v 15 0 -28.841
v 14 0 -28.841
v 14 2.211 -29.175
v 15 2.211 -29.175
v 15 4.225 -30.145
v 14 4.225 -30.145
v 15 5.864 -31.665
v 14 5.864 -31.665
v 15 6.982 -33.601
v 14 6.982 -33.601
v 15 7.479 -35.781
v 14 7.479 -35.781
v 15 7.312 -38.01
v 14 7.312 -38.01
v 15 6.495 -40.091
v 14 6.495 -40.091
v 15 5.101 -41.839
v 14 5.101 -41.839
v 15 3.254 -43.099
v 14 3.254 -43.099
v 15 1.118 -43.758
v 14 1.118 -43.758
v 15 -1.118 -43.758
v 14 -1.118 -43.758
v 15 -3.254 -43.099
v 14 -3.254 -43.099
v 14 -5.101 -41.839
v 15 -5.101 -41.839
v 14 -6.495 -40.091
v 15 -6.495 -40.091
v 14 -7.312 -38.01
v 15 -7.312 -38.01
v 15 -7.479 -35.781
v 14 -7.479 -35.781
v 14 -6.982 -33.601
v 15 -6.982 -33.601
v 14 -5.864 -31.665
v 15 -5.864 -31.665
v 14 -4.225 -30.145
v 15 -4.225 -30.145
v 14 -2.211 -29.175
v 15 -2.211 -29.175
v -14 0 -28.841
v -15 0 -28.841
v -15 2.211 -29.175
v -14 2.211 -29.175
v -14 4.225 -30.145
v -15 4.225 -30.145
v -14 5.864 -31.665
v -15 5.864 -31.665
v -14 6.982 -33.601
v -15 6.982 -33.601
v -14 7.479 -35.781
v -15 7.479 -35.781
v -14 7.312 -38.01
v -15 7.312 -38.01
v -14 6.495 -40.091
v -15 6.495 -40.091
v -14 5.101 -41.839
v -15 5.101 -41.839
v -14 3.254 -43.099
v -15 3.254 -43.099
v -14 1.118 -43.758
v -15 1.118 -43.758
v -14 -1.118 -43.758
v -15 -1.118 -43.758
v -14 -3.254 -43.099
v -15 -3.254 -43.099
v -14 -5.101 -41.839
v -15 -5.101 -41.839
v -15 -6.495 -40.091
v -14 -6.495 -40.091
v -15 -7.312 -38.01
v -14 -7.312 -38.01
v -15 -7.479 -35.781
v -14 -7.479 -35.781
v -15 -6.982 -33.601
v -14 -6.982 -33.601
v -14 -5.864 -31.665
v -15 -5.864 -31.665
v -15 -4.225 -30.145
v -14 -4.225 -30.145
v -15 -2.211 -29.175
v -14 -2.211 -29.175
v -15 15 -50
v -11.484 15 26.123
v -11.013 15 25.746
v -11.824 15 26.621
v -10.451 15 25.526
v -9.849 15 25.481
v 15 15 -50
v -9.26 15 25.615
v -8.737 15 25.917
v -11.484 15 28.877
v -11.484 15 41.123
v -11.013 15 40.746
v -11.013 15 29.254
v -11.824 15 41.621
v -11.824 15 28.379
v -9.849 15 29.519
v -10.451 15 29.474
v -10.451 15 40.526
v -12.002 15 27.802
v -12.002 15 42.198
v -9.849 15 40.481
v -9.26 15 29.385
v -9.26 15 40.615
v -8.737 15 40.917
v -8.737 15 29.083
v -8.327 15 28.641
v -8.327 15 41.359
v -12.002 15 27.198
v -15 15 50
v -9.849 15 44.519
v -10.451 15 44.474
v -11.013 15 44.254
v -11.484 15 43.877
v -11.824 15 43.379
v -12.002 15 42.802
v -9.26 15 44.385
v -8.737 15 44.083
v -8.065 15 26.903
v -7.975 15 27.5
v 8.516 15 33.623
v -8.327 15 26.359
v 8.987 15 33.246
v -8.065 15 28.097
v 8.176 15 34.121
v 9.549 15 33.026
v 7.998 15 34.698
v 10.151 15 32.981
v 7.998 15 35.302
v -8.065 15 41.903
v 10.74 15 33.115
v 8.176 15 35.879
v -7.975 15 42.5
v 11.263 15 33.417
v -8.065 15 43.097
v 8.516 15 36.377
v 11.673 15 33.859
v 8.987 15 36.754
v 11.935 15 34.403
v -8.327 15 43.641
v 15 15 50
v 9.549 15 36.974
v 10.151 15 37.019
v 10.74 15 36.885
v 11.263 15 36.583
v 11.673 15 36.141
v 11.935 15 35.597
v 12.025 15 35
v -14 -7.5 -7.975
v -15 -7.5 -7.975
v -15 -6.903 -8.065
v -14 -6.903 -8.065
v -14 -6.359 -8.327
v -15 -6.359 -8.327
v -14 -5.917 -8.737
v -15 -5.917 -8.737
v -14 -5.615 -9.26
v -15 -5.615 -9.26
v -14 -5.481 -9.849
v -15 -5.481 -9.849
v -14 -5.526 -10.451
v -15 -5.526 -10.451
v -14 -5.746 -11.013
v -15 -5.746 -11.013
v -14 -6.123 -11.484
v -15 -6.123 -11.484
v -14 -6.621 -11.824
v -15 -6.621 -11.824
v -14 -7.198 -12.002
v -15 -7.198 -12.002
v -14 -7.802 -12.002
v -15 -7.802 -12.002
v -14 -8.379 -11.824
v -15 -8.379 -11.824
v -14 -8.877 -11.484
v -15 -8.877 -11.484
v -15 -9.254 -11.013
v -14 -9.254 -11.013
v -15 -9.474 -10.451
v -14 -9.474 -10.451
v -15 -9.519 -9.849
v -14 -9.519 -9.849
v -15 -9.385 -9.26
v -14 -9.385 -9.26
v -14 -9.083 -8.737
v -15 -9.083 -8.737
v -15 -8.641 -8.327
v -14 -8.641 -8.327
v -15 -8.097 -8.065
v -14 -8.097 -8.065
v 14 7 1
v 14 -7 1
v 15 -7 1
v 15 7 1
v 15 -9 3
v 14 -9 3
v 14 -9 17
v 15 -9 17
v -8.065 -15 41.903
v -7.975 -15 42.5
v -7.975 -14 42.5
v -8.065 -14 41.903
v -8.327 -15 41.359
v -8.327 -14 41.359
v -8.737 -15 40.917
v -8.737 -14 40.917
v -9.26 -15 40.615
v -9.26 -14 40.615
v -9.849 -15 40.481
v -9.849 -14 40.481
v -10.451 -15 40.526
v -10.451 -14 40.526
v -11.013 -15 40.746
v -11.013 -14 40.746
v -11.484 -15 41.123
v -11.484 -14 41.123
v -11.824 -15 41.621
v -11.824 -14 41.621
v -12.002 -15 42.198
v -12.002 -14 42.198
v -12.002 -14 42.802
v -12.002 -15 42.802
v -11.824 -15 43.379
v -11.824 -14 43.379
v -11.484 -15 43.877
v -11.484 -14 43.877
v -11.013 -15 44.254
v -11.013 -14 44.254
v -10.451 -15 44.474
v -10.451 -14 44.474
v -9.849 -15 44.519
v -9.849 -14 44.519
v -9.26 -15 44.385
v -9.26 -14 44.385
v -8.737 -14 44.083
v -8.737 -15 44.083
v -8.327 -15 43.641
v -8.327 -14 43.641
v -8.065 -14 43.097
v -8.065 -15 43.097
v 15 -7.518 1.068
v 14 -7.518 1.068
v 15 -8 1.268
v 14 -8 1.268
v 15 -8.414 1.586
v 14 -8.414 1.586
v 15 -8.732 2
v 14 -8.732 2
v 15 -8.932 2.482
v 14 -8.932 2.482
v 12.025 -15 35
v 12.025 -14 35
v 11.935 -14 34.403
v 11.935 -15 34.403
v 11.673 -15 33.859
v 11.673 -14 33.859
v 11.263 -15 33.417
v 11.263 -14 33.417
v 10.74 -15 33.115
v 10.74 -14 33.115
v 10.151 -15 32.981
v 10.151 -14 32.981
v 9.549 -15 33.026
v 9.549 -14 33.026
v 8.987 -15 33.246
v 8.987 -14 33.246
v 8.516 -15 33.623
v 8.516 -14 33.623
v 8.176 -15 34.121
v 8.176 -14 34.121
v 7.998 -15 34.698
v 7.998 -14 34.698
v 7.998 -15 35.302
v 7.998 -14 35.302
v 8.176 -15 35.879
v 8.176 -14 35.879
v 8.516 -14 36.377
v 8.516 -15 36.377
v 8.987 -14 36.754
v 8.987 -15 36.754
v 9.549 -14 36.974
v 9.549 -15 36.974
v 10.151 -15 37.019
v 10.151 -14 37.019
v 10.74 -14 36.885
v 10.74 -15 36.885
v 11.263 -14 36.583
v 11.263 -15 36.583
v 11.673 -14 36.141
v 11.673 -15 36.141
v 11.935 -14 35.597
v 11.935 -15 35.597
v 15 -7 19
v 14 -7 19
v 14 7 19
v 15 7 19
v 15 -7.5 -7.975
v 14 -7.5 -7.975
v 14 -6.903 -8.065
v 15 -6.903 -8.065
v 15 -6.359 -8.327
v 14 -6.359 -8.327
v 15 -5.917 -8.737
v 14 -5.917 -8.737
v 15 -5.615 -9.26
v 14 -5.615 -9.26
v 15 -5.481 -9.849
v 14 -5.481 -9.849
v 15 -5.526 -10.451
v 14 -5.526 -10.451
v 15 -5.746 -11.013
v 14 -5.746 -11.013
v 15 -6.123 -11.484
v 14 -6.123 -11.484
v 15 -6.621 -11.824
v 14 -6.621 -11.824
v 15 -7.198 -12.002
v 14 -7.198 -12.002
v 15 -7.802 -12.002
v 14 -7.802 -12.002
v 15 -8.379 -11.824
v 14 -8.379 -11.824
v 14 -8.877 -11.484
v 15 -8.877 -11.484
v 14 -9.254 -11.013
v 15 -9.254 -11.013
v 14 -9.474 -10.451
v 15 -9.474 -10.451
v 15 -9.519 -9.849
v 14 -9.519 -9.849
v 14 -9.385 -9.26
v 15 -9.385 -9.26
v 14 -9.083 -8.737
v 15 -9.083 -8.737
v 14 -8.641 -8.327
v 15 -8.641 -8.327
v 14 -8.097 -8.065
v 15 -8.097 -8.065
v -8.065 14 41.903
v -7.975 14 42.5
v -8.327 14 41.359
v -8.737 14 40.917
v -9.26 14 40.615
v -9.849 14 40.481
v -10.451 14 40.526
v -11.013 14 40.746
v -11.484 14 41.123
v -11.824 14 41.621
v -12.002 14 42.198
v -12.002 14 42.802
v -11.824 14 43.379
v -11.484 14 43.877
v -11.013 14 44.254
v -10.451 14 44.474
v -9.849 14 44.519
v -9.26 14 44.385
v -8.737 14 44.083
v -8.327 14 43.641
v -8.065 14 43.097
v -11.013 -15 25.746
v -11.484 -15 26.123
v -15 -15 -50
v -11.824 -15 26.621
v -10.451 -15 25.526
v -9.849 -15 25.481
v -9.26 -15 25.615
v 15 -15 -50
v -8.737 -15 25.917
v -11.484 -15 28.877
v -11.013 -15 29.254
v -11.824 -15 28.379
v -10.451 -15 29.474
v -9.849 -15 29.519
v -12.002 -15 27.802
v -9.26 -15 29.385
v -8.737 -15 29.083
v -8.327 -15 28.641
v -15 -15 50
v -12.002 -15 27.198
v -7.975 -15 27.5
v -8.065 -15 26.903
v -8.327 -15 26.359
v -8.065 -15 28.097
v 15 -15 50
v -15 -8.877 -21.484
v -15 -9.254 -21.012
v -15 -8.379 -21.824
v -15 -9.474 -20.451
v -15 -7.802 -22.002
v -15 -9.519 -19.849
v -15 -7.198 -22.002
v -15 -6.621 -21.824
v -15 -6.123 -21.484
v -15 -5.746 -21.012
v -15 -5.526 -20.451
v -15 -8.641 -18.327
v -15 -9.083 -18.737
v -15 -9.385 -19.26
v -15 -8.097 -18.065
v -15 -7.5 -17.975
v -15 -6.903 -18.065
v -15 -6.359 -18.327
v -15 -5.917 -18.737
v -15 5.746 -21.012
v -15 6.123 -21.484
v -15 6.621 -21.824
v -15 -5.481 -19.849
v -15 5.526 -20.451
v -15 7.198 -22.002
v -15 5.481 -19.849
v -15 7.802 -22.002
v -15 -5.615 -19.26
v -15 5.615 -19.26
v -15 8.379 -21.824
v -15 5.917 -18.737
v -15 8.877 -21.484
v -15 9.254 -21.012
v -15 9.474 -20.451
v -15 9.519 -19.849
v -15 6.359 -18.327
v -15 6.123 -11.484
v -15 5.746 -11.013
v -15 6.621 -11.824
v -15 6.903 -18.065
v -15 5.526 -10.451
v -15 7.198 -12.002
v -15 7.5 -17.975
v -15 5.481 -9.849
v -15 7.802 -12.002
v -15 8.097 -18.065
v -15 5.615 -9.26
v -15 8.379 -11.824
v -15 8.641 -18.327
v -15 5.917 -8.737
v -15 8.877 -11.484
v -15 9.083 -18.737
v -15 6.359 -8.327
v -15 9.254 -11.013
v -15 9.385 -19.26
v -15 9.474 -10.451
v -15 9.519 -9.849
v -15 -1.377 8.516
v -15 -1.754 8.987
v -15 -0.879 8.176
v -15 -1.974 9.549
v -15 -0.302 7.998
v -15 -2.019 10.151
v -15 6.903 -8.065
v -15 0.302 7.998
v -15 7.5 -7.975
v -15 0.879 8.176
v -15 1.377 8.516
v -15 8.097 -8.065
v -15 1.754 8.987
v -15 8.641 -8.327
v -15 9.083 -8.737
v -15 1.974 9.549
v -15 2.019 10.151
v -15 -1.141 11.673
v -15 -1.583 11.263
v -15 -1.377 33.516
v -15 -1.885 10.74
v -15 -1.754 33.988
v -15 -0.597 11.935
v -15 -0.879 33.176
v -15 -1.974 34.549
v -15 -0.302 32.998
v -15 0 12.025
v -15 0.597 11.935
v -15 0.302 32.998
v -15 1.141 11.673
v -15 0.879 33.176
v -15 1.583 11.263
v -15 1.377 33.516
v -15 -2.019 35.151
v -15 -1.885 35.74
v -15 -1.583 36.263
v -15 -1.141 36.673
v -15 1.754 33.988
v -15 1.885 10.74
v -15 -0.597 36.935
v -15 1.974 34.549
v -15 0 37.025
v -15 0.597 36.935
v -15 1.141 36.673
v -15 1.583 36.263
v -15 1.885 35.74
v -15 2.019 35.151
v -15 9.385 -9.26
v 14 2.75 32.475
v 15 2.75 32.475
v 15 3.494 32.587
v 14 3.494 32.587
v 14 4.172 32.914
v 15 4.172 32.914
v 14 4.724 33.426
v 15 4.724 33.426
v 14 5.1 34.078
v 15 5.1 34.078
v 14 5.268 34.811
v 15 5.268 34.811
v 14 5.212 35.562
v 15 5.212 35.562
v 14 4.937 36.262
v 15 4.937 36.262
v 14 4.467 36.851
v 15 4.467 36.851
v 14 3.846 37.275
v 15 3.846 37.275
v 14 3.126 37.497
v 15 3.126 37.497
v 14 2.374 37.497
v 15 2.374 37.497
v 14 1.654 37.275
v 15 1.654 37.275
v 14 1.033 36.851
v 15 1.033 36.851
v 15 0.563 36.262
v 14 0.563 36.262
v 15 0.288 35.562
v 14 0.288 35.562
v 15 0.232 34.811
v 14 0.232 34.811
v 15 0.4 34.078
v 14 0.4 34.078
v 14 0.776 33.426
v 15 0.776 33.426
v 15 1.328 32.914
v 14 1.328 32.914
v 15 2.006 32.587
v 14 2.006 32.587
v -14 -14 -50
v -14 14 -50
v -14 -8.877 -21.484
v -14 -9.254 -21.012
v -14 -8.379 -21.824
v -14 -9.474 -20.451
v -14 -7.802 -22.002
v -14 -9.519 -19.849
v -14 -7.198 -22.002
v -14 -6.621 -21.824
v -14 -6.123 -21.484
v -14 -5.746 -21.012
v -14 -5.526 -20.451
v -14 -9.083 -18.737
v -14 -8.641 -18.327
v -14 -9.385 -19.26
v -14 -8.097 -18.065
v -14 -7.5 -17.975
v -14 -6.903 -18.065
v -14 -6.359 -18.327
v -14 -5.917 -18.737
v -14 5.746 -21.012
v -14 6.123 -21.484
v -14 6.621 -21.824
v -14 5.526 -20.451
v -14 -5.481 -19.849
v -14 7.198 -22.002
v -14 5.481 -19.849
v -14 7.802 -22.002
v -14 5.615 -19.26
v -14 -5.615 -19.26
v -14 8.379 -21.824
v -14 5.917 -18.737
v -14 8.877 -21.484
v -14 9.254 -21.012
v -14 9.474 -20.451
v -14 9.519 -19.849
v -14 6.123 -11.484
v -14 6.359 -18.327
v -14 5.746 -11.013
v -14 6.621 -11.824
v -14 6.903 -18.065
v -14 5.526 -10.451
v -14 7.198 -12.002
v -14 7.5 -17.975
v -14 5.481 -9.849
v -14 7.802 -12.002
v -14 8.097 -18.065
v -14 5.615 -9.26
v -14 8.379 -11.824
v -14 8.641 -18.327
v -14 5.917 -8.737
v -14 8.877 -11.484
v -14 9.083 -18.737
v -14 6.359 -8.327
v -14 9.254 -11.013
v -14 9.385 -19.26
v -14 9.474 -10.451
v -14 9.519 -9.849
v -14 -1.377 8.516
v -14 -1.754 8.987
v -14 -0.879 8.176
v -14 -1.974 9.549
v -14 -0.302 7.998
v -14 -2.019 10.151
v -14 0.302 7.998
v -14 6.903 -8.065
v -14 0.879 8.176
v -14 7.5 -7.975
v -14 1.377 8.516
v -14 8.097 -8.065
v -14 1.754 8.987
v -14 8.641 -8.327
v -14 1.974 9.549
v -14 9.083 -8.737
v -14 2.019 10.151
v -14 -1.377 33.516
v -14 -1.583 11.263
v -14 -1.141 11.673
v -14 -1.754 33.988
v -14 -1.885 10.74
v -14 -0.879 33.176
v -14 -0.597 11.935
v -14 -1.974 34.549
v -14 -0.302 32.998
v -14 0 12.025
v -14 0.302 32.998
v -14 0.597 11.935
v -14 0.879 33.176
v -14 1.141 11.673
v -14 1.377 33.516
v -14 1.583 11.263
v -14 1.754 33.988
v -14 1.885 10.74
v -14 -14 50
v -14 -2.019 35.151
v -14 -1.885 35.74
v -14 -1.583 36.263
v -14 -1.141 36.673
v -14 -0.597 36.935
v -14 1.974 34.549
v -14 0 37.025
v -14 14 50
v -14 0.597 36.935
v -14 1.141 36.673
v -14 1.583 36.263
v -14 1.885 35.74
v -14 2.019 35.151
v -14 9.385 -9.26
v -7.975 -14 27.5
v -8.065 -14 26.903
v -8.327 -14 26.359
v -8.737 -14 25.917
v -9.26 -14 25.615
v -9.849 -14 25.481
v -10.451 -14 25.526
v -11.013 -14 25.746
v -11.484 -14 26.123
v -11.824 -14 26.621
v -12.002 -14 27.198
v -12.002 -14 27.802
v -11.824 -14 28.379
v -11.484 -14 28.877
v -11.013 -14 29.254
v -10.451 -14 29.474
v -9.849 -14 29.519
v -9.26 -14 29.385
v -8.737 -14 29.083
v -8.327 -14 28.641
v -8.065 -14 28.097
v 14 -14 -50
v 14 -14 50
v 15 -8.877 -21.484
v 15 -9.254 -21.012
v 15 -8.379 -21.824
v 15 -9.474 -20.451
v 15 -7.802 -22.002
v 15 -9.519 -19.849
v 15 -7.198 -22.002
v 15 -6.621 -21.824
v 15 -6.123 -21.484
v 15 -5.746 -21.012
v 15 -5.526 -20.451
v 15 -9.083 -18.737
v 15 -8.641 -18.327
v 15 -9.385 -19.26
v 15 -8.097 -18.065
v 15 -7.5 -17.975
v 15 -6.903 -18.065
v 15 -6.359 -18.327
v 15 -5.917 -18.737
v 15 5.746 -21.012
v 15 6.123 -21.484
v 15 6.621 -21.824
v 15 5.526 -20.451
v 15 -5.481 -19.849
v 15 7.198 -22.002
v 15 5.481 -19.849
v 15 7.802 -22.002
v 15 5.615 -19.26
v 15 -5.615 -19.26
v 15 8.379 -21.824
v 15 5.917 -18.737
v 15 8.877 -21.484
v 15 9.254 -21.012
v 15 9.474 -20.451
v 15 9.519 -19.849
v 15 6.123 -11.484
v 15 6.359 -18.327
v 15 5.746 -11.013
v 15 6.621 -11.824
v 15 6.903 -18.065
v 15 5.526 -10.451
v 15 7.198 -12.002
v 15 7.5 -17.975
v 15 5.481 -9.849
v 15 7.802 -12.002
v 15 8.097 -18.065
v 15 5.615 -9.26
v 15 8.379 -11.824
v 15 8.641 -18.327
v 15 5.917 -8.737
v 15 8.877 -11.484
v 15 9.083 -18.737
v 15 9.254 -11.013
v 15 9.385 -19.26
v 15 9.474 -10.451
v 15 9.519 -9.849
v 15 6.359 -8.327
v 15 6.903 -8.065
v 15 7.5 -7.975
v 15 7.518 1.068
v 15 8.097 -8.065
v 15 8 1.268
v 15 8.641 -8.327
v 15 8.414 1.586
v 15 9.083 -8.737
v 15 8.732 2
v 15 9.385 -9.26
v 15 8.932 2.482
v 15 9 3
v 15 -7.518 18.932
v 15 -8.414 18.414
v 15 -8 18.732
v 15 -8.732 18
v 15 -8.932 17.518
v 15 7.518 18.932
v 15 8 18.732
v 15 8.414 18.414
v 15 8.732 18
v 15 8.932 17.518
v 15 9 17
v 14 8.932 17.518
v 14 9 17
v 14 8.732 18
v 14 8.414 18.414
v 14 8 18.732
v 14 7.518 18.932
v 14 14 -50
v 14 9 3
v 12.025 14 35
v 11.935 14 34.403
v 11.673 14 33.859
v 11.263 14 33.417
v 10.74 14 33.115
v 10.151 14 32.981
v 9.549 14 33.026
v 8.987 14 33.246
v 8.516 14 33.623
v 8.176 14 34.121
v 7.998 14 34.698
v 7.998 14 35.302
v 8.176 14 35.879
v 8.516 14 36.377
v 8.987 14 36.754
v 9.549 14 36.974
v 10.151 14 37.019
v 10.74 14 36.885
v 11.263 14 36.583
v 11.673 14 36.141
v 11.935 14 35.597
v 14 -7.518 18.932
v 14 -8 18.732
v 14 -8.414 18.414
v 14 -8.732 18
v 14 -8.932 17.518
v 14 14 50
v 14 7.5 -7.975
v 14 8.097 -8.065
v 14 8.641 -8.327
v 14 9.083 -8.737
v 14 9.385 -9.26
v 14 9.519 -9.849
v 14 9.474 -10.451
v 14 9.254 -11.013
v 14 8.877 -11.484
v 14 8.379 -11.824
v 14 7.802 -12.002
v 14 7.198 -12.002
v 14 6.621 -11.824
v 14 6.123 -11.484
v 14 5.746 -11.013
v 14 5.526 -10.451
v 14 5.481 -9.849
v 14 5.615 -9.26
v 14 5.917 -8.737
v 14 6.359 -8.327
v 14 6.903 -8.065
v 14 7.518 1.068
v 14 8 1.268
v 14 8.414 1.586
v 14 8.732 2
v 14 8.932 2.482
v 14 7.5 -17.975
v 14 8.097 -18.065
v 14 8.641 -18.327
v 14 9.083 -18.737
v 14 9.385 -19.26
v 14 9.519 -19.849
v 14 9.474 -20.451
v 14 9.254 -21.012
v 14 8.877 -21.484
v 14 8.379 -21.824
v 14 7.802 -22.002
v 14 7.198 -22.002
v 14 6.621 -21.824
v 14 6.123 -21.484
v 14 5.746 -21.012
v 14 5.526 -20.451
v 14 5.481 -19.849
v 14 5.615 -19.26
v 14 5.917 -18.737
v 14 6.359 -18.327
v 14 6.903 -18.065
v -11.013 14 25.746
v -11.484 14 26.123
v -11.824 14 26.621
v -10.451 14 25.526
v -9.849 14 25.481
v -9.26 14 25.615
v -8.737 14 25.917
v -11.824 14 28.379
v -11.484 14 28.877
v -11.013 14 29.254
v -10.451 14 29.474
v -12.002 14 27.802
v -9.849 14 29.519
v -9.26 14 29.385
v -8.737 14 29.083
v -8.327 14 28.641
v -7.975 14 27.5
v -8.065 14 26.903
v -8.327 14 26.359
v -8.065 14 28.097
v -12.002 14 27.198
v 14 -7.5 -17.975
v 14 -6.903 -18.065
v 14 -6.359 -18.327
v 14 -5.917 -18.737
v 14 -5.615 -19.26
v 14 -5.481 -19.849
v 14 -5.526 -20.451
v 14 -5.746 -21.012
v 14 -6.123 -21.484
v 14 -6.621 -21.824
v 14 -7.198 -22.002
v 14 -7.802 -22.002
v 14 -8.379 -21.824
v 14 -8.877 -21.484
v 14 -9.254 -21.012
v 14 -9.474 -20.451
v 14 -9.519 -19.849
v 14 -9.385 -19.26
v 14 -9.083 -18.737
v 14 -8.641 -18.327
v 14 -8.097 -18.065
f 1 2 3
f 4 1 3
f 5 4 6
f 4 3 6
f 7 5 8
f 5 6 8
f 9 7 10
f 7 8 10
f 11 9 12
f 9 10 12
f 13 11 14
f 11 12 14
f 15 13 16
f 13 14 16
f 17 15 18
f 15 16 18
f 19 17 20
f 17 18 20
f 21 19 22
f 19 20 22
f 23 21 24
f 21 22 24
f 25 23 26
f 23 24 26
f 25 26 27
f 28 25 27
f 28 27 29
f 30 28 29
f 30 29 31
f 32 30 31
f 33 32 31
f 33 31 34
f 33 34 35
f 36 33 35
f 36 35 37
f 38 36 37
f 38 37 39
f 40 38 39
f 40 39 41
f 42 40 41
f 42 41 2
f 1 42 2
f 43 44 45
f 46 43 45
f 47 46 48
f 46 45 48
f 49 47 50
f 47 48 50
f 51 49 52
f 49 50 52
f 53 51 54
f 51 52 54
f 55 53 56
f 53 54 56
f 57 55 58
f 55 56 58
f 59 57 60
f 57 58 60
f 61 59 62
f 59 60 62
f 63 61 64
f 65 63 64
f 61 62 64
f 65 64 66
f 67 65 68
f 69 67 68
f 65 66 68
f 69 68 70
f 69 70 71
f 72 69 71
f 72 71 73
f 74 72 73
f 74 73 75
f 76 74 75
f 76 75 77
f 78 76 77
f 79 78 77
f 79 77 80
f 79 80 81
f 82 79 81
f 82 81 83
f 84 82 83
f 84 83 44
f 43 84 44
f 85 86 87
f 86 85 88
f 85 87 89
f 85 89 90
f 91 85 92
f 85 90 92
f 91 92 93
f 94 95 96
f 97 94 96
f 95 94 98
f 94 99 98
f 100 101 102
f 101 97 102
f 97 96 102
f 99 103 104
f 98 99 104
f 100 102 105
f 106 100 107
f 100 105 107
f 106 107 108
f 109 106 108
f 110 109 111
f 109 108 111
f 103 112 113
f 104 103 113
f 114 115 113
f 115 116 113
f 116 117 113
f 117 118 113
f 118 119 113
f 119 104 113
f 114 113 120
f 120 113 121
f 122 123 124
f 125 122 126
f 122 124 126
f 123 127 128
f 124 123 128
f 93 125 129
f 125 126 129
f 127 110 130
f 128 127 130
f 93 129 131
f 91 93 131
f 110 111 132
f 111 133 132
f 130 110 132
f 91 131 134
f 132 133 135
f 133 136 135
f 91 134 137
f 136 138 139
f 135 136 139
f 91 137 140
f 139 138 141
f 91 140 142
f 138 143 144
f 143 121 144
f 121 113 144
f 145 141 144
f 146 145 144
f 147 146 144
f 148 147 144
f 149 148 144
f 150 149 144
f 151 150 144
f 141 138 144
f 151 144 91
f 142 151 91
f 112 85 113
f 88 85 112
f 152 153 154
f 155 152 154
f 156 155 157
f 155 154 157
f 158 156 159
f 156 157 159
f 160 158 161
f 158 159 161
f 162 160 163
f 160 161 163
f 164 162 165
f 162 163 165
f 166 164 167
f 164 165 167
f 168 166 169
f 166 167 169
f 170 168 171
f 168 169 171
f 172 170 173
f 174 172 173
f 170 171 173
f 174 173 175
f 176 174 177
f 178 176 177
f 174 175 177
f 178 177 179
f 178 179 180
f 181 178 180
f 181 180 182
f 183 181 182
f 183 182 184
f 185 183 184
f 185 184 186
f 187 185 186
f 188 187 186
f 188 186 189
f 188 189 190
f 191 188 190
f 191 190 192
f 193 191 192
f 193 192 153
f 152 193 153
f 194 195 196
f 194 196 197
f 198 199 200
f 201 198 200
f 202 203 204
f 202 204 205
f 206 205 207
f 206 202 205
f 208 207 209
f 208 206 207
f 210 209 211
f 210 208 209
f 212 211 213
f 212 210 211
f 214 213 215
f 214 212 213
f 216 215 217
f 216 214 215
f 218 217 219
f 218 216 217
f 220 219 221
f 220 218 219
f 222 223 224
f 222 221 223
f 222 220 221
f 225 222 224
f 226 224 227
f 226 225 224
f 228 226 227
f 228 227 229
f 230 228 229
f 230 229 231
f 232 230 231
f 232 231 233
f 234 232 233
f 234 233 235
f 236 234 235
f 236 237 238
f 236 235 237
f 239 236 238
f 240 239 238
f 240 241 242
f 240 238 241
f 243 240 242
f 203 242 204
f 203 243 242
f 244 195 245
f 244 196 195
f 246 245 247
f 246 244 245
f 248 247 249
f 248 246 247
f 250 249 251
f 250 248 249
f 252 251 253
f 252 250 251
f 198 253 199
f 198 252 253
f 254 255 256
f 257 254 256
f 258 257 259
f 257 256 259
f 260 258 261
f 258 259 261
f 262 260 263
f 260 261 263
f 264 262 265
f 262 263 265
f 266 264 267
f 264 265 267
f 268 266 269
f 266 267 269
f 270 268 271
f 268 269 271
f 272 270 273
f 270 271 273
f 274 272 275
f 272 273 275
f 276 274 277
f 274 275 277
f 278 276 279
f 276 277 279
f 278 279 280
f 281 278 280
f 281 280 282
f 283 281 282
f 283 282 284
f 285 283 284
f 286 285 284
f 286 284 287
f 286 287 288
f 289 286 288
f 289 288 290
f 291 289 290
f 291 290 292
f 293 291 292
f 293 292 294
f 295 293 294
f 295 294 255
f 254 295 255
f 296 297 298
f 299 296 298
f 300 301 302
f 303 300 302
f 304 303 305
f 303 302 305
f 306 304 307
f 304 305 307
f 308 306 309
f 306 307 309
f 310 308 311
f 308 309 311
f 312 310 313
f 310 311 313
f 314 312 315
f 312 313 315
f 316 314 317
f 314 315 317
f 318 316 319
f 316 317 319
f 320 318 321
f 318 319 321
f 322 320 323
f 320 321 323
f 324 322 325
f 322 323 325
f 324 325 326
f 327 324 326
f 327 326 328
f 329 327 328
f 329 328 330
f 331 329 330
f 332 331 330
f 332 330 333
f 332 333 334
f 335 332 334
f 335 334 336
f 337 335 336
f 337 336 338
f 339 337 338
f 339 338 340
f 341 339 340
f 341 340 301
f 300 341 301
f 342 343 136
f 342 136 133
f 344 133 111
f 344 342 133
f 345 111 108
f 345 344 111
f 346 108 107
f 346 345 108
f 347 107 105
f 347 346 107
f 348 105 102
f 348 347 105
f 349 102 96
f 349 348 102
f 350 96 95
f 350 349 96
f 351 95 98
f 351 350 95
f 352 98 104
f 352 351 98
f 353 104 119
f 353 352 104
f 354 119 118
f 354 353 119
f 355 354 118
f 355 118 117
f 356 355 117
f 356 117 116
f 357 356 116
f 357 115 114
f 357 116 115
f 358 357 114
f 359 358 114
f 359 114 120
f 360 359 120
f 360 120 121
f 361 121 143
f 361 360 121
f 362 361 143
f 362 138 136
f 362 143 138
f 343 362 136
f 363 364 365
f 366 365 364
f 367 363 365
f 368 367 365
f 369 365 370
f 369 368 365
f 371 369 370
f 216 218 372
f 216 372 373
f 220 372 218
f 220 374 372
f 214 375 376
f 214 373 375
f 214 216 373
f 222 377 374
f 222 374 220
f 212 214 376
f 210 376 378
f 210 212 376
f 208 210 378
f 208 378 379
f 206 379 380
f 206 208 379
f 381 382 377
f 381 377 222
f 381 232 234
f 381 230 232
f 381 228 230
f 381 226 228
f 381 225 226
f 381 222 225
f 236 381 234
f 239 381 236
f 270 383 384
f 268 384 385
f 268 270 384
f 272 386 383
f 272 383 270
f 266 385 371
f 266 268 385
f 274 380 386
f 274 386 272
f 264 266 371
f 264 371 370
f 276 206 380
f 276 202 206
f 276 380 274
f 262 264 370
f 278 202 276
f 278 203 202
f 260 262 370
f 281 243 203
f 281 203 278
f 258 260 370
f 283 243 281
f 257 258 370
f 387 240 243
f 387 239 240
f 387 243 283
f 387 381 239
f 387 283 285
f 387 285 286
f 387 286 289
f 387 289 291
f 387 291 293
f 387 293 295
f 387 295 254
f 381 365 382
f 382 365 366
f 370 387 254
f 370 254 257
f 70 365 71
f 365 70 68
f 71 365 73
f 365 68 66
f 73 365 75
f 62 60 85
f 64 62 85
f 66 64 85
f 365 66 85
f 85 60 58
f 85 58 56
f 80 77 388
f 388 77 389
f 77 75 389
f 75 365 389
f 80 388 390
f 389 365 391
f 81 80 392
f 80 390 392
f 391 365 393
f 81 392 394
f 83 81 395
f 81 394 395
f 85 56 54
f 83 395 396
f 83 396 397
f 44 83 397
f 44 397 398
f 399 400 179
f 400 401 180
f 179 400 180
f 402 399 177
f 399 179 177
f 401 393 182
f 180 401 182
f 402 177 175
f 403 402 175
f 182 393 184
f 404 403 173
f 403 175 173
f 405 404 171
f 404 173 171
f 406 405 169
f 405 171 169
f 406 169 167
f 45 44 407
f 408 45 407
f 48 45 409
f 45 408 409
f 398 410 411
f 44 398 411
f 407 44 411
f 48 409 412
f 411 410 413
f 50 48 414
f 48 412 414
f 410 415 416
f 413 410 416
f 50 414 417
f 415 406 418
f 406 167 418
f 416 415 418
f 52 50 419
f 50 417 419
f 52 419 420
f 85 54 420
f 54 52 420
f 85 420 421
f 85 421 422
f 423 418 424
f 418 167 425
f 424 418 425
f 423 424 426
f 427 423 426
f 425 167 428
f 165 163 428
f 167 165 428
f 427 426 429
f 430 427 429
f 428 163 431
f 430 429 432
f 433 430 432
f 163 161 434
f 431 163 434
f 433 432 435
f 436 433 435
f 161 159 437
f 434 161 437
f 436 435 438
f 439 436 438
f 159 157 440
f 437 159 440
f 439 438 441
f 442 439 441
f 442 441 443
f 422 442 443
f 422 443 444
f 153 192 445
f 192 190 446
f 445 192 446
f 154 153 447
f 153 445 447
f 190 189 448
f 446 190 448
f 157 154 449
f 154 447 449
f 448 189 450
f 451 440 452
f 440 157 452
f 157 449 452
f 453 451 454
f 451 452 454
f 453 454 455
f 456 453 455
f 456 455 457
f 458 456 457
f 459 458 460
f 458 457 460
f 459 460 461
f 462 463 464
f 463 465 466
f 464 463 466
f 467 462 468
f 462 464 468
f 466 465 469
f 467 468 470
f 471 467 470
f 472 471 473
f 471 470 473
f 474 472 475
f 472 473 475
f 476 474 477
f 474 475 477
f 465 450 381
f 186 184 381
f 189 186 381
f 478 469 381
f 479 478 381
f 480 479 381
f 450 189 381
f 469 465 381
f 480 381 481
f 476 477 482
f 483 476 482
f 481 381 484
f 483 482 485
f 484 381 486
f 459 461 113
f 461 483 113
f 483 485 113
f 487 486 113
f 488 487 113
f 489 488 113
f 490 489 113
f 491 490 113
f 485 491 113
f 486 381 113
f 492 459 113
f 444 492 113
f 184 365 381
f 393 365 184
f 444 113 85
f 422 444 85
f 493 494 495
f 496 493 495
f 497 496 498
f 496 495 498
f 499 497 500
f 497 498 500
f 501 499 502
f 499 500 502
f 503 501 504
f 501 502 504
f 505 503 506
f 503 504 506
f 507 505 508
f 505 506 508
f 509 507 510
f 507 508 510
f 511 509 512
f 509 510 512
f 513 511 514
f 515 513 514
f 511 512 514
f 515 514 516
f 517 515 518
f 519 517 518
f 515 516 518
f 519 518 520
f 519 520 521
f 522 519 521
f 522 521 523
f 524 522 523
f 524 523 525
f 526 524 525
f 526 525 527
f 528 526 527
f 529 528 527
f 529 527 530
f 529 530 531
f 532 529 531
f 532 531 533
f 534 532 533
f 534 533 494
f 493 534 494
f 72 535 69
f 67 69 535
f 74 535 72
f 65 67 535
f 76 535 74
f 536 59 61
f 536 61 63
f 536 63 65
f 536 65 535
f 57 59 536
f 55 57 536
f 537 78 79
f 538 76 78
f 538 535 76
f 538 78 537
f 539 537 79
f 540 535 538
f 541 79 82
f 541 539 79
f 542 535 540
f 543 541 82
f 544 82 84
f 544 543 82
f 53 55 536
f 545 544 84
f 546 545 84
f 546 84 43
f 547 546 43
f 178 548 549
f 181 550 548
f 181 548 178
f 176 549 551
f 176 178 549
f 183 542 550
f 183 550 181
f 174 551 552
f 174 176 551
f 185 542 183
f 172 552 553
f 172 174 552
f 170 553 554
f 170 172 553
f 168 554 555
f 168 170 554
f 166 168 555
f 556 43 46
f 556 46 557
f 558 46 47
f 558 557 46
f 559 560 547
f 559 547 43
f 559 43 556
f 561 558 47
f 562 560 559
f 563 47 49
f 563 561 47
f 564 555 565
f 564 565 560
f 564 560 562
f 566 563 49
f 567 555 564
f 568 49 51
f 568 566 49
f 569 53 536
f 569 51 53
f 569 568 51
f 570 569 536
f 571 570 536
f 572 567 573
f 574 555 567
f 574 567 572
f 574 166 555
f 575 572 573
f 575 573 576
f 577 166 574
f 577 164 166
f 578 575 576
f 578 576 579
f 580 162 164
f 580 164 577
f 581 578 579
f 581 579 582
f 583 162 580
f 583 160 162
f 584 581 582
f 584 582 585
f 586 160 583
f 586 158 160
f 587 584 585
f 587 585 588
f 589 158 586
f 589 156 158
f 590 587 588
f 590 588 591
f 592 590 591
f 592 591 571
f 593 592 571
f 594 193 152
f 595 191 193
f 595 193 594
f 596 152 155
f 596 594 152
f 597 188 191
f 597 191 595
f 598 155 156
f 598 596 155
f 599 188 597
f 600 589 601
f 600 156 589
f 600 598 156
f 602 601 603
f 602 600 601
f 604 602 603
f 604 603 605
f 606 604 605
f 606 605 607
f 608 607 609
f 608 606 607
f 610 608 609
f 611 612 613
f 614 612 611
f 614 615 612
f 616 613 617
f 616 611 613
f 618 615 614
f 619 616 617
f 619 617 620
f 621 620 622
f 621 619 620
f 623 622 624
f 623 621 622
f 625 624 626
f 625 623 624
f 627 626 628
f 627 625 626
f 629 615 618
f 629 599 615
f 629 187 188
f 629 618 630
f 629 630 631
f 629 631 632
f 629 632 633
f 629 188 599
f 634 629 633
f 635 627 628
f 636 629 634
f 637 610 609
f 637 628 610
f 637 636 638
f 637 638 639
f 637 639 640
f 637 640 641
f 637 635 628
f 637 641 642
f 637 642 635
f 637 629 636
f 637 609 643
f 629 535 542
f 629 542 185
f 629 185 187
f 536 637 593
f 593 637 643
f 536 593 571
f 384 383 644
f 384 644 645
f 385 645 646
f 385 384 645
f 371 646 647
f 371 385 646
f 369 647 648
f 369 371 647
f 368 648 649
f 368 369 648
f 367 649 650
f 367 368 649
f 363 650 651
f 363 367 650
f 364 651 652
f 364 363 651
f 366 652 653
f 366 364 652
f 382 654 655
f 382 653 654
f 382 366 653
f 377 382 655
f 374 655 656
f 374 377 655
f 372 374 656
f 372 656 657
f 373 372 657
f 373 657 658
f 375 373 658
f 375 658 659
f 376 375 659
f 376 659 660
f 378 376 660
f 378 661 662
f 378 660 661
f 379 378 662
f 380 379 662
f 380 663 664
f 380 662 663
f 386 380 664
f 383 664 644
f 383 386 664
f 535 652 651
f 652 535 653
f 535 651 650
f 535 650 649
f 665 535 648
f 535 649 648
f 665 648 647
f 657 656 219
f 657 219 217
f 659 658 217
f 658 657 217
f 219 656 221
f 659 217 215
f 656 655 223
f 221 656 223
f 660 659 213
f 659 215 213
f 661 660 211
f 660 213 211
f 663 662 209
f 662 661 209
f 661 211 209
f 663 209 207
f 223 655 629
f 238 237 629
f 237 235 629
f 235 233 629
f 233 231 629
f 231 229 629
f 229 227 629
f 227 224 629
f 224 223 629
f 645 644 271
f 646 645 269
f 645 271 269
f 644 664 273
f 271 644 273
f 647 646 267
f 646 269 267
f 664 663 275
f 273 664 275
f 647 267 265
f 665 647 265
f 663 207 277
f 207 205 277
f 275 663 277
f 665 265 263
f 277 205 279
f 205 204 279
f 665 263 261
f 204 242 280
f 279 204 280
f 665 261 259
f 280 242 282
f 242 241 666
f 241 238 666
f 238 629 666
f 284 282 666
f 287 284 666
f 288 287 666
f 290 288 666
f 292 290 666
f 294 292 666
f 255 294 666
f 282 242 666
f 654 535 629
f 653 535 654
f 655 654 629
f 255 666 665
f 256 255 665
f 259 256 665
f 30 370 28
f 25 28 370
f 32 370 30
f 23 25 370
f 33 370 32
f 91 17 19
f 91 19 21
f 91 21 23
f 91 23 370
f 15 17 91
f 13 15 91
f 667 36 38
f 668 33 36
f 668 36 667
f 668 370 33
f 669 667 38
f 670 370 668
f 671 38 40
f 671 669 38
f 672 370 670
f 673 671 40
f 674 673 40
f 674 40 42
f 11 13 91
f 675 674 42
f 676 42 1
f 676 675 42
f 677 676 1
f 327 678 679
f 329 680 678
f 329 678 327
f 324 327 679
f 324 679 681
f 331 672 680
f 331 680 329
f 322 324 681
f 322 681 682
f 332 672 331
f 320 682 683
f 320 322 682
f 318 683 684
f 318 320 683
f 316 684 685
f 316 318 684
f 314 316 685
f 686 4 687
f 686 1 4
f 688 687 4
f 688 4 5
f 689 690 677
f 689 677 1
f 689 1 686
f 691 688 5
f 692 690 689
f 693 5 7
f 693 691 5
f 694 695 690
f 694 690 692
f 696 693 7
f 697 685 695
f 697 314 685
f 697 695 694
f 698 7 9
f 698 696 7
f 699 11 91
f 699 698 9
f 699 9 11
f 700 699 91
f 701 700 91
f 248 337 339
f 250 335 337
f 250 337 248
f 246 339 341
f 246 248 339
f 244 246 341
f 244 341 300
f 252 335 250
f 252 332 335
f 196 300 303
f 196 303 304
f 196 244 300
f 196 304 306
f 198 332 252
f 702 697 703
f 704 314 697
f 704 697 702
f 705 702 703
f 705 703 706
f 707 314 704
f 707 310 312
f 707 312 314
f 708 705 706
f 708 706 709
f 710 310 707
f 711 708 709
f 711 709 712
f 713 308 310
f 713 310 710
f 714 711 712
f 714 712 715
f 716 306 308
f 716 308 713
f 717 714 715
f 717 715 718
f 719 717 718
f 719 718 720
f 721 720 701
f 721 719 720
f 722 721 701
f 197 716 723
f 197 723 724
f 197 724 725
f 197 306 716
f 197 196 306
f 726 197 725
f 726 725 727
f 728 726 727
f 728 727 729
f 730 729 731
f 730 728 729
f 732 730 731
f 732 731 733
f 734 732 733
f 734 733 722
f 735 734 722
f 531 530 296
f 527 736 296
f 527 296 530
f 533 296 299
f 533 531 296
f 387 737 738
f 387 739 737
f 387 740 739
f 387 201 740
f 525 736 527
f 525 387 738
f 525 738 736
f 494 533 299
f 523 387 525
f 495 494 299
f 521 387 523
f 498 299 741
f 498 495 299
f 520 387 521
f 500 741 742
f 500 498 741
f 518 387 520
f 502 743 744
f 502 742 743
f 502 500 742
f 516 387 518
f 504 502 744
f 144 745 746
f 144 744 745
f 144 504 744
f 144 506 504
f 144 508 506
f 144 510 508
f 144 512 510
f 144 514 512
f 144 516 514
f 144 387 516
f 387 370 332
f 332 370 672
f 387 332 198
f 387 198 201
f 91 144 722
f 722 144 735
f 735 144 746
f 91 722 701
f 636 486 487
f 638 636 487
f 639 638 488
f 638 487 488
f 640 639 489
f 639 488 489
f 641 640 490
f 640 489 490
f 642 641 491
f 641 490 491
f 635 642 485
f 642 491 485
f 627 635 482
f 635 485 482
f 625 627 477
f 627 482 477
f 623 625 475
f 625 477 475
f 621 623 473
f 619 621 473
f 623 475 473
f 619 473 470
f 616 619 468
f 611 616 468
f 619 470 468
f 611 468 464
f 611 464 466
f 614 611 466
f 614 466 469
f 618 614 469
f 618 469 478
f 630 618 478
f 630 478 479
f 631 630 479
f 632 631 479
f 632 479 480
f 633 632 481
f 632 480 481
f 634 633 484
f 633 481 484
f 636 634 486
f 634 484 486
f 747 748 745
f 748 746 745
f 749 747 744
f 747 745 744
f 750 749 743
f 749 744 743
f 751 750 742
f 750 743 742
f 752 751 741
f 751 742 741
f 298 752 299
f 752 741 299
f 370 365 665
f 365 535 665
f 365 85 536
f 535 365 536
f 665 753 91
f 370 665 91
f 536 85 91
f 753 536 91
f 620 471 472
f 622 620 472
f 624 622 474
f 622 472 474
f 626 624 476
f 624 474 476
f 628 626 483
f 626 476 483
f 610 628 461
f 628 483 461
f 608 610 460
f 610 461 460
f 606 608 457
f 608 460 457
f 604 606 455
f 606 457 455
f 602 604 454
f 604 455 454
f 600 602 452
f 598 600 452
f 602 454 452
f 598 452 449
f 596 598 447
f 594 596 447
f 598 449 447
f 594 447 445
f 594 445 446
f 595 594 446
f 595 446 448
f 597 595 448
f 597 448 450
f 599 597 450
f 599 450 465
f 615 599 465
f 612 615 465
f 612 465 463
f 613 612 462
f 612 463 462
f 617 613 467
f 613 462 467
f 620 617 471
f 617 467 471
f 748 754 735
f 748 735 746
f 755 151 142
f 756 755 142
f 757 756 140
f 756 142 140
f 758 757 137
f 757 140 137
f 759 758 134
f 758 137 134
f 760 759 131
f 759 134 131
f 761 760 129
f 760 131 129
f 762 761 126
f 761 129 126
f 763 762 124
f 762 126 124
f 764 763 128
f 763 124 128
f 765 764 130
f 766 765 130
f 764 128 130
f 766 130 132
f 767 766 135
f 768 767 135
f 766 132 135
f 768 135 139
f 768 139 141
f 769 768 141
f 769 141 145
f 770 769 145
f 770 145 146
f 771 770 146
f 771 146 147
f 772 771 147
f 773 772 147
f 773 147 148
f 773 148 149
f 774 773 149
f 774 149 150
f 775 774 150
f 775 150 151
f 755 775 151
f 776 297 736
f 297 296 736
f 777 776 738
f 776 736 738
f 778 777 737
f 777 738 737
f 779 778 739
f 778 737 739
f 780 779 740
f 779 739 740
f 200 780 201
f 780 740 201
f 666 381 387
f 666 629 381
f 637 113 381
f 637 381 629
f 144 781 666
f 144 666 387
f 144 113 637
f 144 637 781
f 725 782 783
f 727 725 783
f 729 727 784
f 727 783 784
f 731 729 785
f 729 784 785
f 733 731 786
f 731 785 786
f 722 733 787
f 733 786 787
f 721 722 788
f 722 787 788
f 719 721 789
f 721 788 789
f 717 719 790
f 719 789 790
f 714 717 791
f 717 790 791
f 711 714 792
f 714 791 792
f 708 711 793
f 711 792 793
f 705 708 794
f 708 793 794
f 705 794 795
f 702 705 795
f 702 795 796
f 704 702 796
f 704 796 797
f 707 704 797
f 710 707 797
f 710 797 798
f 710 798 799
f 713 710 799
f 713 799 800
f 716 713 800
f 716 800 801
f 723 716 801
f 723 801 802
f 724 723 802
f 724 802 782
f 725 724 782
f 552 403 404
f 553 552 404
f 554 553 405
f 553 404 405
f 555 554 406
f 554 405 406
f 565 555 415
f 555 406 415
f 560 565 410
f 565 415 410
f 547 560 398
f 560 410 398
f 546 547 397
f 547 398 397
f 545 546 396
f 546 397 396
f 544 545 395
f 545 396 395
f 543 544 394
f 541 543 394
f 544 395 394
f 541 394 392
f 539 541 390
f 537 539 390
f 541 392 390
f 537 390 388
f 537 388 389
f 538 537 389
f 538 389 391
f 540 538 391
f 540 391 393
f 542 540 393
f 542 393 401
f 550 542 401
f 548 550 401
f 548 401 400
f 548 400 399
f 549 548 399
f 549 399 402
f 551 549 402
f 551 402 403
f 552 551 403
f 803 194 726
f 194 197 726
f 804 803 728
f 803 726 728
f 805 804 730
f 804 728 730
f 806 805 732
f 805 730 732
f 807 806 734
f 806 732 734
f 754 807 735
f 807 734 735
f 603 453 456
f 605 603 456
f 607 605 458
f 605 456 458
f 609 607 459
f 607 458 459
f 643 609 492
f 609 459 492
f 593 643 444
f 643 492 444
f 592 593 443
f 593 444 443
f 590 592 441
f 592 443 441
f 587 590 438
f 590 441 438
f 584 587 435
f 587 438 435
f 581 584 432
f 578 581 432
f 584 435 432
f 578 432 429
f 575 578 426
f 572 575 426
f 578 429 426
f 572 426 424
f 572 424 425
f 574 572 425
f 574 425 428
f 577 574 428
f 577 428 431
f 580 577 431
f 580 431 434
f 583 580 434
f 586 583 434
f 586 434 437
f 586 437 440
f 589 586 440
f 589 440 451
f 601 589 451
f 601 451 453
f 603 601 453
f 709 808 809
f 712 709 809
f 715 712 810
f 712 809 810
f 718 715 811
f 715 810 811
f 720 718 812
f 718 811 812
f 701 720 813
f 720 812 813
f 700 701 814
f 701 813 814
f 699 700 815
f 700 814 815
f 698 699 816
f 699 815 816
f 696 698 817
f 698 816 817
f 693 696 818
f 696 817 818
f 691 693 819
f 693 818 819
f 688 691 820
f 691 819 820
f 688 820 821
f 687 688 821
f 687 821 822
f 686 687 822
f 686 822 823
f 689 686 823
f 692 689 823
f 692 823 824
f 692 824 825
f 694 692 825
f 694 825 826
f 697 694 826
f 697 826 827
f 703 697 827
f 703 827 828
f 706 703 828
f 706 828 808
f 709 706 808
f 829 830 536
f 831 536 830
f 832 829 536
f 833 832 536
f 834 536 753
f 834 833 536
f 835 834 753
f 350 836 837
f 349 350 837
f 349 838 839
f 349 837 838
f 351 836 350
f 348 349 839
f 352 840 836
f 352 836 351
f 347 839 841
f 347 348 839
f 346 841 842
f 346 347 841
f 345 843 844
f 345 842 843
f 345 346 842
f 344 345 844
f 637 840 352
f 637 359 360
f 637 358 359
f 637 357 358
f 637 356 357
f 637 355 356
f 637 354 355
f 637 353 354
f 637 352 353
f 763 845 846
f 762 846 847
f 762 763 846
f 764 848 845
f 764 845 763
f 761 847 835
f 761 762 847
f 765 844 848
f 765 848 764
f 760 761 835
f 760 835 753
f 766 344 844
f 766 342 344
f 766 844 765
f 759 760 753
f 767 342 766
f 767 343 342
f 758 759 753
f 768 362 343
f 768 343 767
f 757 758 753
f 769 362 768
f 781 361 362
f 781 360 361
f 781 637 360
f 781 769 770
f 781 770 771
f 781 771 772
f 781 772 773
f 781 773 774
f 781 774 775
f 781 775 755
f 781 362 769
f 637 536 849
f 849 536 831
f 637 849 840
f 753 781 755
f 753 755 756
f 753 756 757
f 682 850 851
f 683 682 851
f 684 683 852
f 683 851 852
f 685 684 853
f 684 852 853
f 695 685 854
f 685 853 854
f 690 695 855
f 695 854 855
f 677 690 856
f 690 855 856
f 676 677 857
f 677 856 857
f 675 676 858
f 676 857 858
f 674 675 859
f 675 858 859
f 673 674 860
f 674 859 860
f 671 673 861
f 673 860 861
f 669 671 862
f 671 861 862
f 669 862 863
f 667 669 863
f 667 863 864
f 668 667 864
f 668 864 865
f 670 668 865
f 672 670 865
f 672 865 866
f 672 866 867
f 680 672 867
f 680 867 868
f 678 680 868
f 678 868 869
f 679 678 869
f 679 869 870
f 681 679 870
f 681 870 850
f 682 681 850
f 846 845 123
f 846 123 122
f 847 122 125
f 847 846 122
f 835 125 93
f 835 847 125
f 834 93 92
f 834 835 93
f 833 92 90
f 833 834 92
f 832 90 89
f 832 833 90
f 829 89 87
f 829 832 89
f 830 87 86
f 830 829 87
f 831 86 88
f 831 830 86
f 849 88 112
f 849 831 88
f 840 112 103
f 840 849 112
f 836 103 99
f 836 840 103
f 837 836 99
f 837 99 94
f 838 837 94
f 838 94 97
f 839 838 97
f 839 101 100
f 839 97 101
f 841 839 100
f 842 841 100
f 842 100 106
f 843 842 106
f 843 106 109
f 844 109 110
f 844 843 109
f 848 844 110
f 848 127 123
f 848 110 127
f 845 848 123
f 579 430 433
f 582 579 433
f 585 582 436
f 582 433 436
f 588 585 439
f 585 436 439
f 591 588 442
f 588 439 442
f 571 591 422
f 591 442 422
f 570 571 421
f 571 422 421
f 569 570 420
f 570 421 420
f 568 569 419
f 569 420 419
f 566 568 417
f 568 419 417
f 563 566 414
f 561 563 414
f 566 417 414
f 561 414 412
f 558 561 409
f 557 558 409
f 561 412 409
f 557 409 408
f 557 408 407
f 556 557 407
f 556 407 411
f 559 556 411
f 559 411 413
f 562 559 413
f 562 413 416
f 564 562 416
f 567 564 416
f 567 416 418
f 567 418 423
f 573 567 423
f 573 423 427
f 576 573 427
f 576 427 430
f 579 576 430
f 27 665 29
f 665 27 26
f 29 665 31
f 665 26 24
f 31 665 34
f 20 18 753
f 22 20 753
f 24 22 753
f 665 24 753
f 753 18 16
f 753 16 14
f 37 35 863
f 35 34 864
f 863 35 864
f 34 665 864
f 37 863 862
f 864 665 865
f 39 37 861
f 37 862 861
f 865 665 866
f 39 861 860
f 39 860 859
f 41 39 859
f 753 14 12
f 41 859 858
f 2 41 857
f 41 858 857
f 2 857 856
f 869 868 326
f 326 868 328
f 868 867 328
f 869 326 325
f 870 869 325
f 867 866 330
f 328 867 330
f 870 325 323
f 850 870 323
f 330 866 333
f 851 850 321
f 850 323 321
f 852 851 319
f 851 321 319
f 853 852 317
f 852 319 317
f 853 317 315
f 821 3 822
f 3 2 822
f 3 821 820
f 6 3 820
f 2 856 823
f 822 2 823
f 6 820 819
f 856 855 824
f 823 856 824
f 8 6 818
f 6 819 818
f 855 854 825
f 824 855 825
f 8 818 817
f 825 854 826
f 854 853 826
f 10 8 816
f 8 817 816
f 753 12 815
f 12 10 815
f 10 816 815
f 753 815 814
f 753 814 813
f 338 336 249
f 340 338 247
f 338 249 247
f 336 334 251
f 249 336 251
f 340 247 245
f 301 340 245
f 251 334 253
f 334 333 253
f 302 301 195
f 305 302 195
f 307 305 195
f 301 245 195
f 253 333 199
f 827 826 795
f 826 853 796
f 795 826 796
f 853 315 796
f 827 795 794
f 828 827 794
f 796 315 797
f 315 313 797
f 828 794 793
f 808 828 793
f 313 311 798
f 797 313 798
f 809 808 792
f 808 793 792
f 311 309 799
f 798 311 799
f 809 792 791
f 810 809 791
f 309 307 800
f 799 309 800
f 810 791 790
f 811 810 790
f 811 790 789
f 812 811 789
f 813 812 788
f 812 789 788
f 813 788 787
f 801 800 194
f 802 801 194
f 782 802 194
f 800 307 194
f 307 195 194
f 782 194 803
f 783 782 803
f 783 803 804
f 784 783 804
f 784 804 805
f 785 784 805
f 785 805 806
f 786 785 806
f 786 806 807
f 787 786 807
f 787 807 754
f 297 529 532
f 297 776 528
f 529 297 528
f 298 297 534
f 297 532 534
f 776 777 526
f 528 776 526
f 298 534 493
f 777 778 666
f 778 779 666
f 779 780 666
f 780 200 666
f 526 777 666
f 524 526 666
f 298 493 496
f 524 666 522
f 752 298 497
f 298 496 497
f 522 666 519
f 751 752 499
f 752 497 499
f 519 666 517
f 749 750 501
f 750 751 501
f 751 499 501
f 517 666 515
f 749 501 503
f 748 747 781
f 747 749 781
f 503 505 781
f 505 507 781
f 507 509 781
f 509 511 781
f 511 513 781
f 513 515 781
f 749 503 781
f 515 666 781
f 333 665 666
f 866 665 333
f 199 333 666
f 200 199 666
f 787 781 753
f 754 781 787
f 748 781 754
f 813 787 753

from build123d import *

# Parameters (mm, degrees)
SKETCH_1_W               = 30
SKETCH_1_H               = 30
EXTRUDE_1_DEPTH          = 50
SKETCH_2_W               = 28
SKETCH_2_H               = 28
CUT_EXTRUDE_1_DEPTH      = 1
CUT_EXTRUDE_1_DEPTH_BACK = 101
SKETCH_3_R               = 2.025
CUT_EXTRUDE_2_DEPTH      = 1
SKETCH_4_W               = 18
SKETCH_4_H               = 18
CUT_EXTRUDE_3_DEPTH      = 1
FILLET_1_R               = 2
CUT_EXTRUDE_START        = -2
SKETCH_5_R               = 2.025
CUT_EXTRUDE_5_DEPTH      = 32
SKETCH_6_R               = 2.025
CUT_EXTRUDE_6_DEPTH      = 1
CUT_EXTRUDE_6_DEPTH_BACK = 31
SKETCH_7_R               = 7.5
CUT_EXTRUDE_7_DEPTH      = 1
CUT_EXTRUDE_7_DEPTH_BACK = 31
SKETCH_8_R               = 2.025
CUT_EXTRUDE_8_DEPTH      = 1
CUT_EXTRUDE_8_DEPTH_BACK = 31
SKETCH_9_R               = 2.25
EXTRUDE_2_DEPTH          = 1
SKETCH_10_R              = 2.5
EXTRUDE_3_DEPTH          = 1
SKETCH_11_R              = 2.025
CUT_EXTRUDE_9_DEPTH      = 1
CUT_EXTRUDE_9_DEPTH_BACK = 31
SKETCH_12_R              = 2.5
EXTRUDE_4_DEPTH          = 1
CUT_EXTRUDE_10_REACH     = 32
SKETCH_13_R              = 2.525


with BuildPart() as part:
    # 草图1 → 凸台-拉伸1 (new body, symmetric)
    with BuildSketch(Plane.XY):
        Rectangle(SKETCH_1_W, SKETCH_1_H)
    extrude(amount=EXTRUDE_1_DEPTH, both=True)

    # 草图2 → 切除-拉伸1 (cut, two sides)
    with BuildSketch(Plane.XY.offset(50)) as cut_extrude_1_sk:
        Rectangle(SKETCH_2_W, SKETCH_2_H)
    extrude(amount=CUT_EXTRUDE_1_DEPTH, mode=Mode.SUBTRACT)
    extrude(cut_extrude_1_sk.sketch, amount=-CUT_EXTRUDE_1_DEPTH_BACK, mode=Mode.SUBTRACT)

    # 草图3 → 切除-拉伸2 (cut)
    with BuildSketch(Plane.ZY.offset(15)):
        with Locations((10, 0)):
            Circle(SKETCH_3_R)
        with Locations((35, 0)):
            Circle(SKETCH_3_R)
    extrude(amount=-CUT_EXTRUDE_2_DEPTH, mode=Mode.SUBTRACT)

    # 草图4 → 切除-拉伸3 (cut)
    with BuildSketch(Plane.ZY.offset(-14)):
        with Locations((10, 0)):
            Rectangle(SKETCH_4_W, SKETCH_4_H)
    extrude(amount=-CUT_EXTRUDE_3_DEPTH, mode=Mode.SUBTRACT)

    # 圆角1
    fillet_1_edges = [part.edges().sort_by_distance(p)[0] for p in [
        (14.5, 9, 19),
        (14.5, -9, 19),
        (14.5, -9, 1),
        (14.5, 9, 1),
    ]]
    fillet(fillet_1_edges, radius=FILLET_1_R)

    # 草图5 → 切除-拉伸5 (cut)
    with BuildSketch(Plane(origin=(0, -14, 0), x_dir=(1, 0, 0), z_dir=(0, 1, 0)).offset(CUT_EXTRUDE_START)):
        with Locations((-10, -27.5)):
            Circle(SKETCH_5_R)
        with Locations((-10, -42.5)):
            Circle(SKETCH_5_R)
    cut_extrude_5 = extrude(amount=CUT_EXTRUDE_5_DEPTH, mode=Mode.SUBTRACT)

    # 镜向1: 切除-拉伸5 across plane
    add(cut_extrude_5.mirror(Plane(origin=(0, 0, 0), x_dir=(0, 0, 1), z_dir=(1, 0, 0))), mode=Mode.SUBTRACT)

    # 草图6 → 切除-拉伸6 (cut, two sides)
    with BuildSketch(Plane.ZY.offset(15)) as cut_extrude_6_sk:
        with Locations((35, 0)):
            Circle(SKETCH_6_R)
        with Locations((-20, -7.5)):
            Circle(SKETCH_6_R)
        with Locations((-20, 7.5)):
            Circle(SKETCH_6_R)
    extrude(amount=CUT_EXTRUDE_6_DEPTH, mode=Mode.SUBTRACT)
    extrude(cut_extrude_6_sk.sketch, amount=-CUT_EXTRUDE_6_DEPTH_BACK, mode=Mode.SUBTRACT)

    # 草图7 → 切除-拉伸7 (cut, two sides)
    with BuildSketch(Plane.ZY.offset(15)) as cut_extrude_7_sk:
        with Locations((-36.341476857, 0)):
            Circle(SKETCH_7_R)
    extrude(amount=CUT_EXTRUDE_7_DEPTH, mode=Mode.SUBTRACT)
    extrude(cut_extrude_7_sk.sketch, amount=-CUT_EXTRUDE_7_DEPTH_BACK, mode=Mode.SUBTRACT)

    # 草图8 → 切除-拉伸8 (cut, two sides)
    with BuildSketch(Plane.ZY.offset(15)) as cut_extrude_8_sk:
        with Locations((-10, 7.5)):
            Circle(SKETCH_8_R)
        with Locations((-10, -7.5)):
            Circle(SKETCH_8_R)
    extrude(amount=CUT_EXTRUDE_8_DEPTH, mode=Mode.SUBTRACT)
    extrude(cut_extrude_8_sk.sketch, amount=-CUT_EXTRUDE_8_DEPTH_BACK, mode=Mode.SUBTRACT)

    # 草图9 → 凸台-拉伸2 (add)
    with BuildSketch(Plane(origin=(0, 15, 0), x_dir=(1, 0, 0), z_dir=(0, 1, 0))):
        with Locations((10, -27.5)):
            Circle(SKETCH_9_R)
        with Locations((10, -42.5)):
            Circle(SKETCH_9_R)
    extrude(amount=-EXTRUDE_2_DEPTH)

    # 草图10 → 凸台-拉伸3 (add)
    with BuildSketch(Plane.XZ.offset(15)):
        with Locations((10, 42.5)):
            Circle(SKETCH_10_R)
        with Locations((10, 27.5)):
            Circle(SKETCH_10_R)
    extrude(amount=-EXTRUDE_3_DEPTH)

    # 草图11 → 切除-拉伸9 (cut, two sides)
    with BuildSketch(Plane(origin=(0, 15, 0), x_dir=(1, 0, 0), z_dir=(0, 1, 0))) as cut_extrude_9_sk:
        with Locations((10, -35)):
            Circle(SKETCH_11_R)
    extrude(amount=CUT_EXTRUDE_9_DEPTH, mode=Mode.SUBTRACT)
    extrude(cut_extrude_9_sk.sketch, amount=-CUT_EXTRUDE_9_DEPTH_BACK, mode=Mode.SUBTRACT)

    # 草图12 → 凸台-拉伸4 (add)
    with BuildSketch(Plane(origin=(15, 0, 0), x_dir=(0, 0, -1), z_dir=(1, 0, 0))):
        with Locations((-35, 0)):
            Circle(SKETCH_12_R)
    extrude(amount=-EXTRUDE_4_DEPTH)

    # 草图13 → 切除-拉伸10 (cut, up to next)
    with BuildSketch(Plane(origin=(15, 0, 0), x_dir=(0, 0, -1), z_dir=(1, 0, 0)), mode=Mode.PRIVATE) as cut_extrude_10_sk1:
        with Locations((-35, 2.75)):
            Circle(SKETCH_13_R)
    cut_extrude_10_tool1 = extrude(cut_extrude_10_sk1.sketch, amount=-CUT_EXTRUDE_10_REACH, mode=Mode.PRIVATE) & part.part
    add(cut_extrude_10_tool1.solids().sort_by_distance((15, 2.75, 35))[0], mode=Mode.SUBTRACT)


solid = part.part
